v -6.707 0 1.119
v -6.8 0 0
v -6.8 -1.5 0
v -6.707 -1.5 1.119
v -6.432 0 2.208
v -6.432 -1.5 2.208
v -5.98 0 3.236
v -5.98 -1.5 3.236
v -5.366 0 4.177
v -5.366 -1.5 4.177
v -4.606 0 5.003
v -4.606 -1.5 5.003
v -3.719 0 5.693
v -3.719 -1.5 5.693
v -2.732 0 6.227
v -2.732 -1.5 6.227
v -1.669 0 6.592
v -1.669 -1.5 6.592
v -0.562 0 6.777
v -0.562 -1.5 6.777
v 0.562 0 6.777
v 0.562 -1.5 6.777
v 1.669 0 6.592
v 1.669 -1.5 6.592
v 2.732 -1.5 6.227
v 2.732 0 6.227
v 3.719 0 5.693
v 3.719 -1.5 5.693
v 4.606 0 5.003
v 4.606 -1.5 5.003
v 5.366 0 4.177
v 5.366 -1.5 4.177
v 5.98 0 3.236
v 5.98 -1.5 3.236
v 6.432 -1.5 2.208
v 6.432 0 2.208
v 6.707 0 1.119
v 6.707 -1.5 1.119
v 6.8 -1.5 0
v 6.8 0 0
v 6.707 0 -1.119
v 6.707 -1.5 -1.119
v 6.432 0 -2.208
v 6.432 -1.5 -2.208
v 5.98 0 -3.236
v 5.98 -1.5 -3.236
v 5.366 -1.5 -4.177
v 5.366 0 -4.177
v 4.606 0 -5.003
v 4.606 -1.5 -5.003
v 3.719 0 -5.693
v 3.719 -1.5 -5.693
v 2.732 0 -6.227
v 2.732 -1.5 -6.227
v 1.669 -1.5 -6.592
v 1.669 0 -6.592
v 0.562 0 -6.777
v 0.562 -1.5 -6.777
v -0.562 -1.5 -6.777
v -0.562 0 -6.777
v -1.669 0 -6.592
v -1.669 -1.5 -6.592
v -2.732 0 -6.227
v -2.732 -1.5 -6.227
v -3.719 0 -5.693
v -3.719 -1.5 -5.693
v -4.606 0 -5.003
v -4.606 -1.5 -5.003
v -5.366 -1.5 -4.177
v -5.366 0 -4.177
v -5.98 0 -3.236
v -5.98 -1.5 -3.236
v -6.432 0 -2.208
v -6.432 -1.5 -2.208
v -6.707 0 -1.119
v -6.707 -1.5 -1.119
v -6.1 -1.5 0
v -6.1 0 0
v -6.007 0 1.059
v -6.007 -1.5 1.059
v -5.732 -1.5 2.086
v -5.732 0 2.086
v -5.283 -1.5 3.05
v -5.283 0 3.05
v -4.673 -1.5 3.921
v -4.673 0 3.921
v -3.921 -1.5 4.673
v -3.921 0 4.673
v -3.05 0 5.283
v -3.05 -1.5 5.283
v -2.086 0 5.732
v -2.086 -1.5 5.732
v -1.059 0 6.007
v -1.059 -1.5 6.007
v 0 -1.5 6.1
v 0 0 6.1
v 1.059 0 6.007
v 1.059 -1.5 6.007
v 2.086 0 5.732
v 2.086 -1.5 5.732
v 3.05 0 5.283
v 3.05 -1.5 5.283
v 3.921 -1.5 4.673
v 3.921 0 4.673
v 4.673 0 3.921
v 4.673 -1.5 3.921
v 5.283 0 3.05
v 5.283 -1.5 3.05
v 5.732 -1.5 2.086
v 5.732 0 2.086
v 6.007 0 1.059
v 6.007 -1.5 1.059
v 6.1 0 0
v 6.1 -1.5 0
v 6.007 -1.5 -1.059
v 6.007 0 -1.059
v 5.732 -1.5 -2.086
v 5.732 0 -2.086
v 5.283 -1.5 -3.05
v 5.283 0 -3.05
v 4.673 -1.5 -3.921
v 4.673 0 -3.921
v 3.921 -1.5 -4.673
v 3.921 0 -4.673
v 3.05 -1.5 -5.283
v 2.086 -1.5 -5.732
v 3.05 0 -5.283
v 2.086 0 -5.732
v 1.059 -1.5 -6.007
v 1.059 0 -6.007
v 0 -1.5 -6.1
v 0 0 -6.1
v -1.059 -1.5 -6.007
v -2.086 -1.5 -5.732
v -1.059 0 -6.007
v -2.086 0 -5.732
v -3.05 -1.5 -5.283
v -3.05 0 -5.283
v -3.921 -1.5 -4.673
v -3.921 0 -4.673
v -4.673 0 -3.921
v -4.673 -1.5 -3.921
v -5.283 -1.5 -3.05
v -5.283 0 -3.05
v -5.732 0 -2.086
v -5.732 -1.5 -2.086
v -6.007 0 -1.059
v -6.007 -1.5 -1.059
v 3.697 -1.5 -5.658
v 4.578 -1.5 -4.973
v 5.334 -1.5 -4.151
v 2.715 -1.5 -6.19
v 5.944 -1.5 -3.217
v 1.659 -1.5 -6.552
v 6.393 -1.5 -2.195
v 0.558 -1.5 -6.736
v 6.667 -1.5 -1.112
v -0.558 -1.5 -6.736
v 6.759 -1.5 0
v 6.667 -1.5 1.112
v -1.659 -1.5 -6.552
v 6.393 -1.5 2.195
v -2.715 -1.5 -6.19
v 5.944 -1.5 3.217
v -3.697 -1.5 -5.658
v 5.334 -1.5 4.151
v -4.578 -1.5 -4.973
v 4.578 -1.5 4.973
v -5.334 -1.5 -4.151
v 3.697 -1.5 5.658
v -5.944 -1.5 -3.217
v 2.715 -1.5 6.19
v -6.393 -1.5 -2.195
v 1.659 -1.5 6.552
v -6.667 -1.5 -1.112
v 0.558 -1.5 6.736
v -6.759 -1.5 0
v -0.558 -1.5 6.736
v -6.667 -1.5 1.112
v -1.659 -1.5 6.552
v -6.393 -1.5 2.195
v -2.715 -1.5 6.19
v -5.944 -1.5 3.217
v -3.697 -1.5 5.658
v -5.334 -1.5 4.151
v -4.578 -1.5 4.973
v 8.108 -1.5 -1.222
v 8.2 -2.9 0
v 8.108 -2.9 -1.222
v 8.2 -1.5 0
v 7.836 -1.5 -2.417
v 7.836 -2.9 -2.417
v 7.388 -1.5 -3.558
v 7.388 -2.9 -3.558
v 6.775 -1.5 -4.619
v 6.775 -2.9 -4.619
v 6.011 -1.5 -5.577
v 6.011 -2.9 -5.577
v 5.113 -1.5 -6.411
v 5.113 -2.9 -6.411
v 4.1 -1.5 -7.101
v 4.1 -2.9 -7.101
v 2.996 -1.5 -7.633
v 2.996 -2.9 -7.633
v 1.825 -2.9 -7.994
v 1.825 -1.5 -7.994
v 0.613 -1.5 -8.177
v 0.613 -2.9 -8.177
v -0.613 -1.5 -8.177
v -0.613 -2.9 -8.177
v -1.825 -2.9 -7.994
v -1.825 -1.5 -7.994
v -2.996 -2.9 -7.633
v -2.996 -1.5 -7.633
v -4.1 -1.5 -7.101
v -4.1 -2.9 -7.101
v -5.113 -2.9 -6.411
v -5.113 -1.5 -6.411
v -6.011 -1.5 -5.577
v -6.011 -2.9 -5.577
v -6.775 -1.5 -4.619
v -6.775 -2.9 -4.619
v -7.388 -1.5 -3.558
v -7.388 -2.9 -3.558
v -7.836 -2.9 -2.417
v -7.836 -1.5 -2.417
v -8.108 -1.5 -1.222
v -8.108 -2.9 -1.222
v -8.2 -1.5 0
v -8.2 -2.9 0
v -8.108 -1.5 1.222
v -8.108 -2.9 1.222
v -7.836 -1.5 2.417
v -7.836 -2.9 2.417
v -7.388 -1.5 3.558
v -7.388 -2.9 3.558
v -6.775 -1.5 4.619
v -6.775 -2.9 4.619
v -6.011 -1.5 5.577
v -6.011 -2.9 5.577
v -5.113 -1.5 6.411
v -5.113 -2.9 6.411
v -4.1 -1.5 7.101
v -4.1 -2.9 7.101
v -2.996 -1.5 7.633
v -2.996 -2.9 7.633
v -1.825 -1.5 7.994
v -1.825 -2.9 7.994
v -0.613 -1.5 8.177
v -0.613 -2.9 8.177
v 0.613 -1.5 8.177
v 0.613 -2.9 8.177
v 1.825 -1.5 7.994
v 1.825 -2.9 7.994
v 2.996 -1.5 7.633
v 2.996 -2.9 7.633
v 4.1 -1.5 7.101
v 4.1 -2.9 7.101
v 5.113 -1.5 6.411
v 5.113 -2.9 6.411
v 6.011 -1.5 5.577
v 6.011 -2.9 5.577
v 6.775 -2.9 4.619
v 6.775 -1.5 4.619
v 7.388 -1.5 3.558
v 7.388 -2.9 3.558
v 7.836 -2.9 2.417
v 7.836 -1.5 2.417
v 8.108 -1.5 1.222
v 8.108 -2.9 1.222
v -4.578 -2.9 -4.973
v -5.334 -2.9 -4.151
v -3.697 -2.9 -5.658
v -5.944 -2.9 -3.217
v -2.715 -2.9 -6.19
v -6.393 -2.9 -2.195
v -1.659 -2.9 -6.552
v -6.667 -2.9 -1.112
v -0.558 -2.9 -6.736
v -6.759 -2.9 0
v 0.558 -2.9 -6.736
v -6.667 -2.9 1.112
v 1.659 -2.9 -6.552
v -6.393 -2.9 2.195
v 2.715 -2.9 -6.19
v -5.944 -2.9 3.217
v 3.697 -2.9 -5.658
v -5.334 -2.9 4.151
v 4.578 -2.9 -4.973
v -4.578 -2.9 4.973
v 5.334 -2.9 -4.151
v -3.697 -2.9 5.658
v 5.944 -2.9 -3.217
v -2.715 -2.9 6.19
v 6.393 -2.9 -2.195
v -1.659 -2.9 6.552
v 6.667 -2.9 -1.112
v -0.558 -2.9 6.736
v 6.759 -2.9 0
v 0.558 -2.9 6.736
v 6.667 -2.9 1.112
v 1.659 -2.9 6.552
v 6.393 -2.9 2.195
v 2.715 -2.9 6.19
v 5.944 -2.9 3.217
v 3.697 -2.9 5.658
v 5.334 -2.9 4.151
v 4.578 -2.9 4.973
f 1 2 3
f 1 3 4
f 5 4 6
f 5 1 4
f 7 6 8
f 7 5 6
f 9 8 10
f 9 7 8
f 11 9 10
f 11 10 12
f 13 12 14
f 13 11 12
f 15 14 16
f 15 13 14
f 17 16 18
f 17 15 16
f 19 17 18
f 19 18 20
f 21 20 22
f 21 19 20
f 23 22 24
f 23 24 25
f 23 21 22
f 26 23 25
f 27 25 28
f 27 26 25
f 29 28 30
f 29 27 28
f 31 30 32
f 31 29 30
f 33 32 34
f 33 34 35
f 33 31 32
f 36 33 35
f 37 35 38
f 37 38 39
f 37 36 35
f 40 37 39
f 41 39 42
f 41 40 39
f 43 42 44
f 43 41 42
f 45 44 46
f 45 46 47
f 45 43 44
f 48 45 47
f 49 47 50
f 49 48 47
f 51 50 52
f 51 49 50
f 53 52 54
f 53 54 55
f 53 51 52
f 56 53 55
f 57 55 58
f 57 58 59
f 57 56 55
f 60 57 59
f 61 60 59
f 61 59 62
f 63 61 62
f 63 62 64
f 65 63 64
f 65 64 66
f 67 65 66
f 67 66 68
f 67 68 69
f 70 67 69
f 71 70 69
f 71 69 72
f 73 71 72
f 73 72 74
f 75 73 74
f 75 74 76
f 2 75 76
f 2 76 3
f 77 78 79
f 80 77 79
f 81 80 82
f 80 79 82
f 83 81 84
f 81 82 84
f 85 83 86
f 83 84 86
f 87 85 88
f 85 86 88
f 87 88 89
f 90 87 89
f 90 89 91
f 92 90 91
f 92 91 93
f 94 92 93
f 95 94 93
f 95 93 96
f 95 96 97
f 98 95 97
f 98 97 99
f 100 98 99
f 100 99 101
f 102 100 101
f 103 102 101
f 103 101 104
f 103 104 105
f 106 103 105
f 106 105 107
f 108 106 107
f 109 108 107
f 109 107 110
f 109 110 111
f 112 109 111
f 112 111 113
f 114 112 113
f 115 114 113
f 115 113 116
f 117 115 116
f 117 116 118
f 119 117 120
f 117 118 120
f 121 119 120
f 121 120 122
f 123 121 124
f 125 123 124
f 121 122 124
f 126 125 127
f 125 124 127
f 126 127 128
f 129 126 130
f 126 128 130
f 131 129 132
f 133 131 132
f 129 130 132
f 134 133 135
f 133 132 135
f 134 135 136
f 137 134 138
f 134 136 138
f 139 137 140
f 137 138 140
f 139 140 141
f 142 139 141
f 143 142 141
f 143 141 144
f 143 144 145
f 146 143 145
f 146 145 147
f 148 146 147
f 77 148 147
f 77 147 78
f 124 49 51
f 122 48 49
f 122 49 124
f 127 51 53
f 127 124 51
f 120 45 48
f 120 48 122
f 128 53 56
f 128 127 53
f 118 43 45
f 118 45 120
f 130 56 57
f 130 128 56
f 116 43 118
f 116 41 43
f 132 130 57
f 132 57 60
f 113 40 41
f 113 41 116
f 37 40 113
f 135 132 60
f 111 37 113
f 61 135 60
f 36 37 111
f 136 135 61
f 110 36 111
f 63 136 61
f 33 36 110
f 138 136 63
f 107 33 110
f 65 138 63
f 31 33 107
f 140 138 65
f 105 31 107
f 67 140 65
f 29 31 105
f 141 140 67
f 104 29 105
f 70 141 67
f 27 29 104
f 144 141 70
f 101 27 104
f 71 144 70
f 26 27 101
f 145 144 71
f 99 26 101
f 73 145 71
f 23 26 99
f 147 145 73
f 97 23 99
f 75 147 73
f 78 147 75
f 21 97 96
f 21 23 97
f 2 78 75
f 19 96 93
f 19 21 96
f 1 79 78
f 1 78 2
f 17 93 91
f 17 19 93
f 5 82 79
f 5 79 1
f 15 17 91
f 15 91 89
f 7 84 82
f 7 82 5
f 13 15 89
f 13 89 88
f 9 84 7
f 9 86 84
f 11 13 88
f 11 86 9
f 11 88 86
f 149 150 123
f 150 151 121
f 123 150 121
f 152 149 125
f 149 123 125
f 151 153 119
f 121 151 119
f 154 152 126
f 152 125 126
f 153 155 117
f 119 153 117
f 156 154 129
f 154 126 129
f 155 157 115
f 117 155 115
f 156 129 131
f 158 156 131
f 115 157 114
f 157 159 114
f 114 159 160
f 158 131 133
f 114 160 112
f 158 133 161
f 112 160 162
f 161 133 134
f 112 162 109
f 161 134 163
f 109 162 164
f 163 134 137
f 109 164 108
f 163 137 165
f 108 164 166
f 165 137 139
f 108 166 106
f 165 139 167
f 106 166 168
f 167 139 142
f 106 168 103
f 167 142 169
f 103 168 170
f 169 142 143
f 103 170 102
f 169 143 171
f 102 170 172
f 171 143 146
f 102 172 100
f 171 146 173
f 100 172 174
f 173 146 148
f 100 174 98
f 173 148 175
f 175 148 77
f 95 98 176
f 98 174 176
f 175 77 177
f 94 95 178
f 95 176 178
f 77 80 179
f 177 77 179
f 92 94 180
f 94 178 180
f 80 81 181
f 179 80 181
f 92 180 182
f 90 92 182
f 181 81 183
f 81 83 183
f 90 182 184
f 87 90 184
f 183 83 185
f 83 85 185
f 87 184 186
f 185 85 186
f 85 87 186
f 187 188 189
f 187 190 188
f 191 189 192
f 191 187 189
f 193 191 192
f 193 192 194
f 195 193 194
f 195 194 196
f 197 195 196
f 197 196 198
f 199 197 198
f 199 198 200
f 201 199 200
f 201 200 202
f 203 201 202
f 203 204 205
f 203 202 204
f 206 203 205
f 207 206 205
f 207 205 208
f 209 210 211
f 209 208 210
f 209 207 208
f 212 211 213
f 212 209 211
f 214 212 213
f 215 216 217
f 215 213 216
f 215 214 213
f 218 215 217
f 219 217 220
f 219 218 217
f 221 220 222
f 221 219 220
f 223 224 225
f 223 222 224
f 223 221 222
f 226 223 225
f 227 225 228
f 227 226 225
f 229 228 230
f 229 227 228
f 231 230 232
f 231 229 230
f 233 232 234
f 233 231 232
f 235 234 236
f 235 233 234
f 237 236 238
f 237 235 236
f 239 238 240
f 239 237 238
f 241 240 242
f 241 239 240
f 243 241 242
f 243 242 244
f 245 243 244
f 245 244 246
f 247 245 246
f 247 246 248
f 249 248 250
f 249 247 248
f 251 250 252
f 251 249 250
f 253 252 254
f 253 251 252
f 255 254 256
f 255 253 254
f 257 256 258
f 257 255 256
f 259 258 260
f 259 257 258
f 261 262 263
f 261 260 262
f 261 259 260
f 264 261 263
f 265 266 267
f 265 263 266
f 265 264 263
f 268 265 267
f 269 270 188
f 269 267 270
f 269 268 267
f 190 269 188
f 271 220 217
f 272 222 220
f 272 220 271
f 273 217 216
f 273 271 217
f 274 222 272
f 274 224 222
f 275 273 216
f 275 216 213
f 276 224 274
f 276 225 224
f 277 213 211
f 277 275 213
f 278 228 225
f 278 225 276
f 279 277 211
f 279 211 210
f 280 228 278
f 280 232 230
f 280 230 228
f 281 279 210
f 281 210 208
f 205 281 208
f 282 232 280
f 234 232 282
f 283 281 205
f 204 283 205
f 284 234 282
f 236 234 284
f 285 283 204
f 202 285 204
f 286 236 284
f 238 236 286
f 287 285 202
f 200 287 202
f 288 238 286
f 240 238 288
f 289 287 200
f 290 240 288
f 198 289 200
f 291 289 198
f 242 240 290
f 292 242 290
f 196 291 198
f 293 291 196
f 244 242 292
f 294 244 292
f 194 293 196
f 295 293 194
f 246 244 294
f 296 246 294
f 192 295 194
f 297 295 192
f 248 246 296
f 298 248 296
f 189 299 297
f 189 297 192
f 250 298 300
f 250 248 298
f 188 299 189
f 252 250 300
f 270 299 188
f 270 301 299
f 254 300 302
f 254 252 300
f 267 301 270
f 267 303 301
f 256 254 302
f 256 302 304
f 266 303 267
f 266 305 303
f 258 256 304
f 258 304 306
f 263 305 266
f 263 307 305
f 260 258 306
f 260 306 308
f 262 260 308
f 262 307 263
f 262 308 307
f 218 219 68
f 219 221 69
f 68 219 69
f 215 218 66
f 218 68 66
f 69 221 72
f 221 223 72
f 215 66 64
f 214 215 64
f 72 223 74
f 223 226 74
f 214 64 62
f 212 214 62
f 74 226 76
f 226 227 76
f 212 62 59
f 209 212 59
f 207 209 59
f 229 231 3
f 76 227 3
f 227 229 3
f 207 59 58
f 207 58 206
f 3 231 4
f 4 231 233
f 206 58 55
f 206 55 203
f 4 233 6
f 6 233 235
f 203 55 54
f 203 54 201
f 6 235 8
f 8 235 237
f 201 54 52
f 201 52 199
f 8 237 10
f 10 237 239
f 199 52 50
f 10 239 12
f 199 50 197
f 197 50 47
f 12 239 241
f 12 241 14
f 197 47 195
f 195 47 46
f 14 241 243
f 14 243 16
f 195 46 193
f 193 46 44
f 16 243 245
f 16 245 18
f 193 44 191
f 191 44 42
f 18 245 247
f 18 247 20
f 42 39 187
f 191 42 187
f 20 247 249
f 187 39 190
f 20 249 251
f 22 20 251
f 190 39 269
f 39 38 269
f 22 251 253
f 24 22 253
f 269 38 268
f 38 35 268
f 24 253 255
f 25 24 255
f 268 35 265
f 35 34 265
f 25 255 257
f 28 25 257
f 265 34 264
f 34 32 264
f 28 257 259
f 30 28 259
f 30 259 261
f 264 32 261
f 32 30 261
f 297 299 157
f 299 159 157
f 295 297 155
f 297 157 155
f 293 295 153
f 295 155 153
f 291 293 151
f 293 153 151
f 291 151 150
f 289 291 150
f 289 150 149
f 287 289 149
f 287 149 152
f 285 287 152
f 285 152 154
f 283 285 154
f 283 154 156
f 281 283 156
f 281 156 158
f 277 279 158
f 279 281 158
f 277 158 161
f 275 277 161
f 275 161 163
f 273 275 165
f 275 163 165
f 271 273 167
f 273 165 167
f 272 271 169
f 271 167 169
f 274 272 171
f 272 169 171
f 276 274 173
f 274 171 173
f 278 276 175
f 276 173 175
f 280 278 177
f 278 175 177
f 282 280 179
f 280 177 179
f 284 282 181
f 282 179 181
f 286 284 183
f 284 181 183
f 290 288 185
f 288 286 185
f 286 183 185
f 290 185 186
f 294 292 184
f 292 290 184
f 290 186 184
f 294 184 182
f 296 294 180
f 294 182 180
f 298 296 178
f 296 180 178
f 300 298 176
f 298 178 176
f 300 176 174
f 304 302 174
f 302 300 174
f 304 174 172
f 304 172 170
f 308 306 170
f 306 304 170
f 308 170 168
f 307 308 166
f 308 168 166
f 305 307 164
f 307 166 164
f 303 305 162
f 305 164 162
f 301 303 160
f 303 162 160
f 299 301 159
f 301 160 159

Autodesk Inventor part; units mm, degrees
ref_plane "YZ Plane" through (0, 0, 0) normal (1, 0, 0) x (0, 1, 0)
ref_plane "XZ Plane" through (0, 0, 0) normal (0, 1, 0) x (-1, 0, 0)
ref_plane "XY Plane" through (0, 0, 0) normal (0, 0, 1) x (1, 0, 0)
sketch "Boceto1" plane through (0, 0, 0) normal (0, 1, 0) x (-1, 0, 0)
  circle A0 centre (0, 0) radius 6.8
  circle A1 centre (0, 0) radius 6.1
  dimension "d0" = 13.6
  dimension "d1" = 12.2
extrude "Extrusión1" add sketch "Boceto1" against normal blind 1.5
sketch "Boceto2" plane through (0, -1.5, 0) normal (0, -1, 0) x (1, 0, 0)
  circle A0 centre (0, 0) radius 6.7588
  circle A1 centre (0, 0) radius 8.2
  dimension "d4" = 16.4
extrude "Extrusión2" add sketch "Boceto2" along normal blind 1.4
properties part number "Elemento_externo" material "Plástico ABS"
